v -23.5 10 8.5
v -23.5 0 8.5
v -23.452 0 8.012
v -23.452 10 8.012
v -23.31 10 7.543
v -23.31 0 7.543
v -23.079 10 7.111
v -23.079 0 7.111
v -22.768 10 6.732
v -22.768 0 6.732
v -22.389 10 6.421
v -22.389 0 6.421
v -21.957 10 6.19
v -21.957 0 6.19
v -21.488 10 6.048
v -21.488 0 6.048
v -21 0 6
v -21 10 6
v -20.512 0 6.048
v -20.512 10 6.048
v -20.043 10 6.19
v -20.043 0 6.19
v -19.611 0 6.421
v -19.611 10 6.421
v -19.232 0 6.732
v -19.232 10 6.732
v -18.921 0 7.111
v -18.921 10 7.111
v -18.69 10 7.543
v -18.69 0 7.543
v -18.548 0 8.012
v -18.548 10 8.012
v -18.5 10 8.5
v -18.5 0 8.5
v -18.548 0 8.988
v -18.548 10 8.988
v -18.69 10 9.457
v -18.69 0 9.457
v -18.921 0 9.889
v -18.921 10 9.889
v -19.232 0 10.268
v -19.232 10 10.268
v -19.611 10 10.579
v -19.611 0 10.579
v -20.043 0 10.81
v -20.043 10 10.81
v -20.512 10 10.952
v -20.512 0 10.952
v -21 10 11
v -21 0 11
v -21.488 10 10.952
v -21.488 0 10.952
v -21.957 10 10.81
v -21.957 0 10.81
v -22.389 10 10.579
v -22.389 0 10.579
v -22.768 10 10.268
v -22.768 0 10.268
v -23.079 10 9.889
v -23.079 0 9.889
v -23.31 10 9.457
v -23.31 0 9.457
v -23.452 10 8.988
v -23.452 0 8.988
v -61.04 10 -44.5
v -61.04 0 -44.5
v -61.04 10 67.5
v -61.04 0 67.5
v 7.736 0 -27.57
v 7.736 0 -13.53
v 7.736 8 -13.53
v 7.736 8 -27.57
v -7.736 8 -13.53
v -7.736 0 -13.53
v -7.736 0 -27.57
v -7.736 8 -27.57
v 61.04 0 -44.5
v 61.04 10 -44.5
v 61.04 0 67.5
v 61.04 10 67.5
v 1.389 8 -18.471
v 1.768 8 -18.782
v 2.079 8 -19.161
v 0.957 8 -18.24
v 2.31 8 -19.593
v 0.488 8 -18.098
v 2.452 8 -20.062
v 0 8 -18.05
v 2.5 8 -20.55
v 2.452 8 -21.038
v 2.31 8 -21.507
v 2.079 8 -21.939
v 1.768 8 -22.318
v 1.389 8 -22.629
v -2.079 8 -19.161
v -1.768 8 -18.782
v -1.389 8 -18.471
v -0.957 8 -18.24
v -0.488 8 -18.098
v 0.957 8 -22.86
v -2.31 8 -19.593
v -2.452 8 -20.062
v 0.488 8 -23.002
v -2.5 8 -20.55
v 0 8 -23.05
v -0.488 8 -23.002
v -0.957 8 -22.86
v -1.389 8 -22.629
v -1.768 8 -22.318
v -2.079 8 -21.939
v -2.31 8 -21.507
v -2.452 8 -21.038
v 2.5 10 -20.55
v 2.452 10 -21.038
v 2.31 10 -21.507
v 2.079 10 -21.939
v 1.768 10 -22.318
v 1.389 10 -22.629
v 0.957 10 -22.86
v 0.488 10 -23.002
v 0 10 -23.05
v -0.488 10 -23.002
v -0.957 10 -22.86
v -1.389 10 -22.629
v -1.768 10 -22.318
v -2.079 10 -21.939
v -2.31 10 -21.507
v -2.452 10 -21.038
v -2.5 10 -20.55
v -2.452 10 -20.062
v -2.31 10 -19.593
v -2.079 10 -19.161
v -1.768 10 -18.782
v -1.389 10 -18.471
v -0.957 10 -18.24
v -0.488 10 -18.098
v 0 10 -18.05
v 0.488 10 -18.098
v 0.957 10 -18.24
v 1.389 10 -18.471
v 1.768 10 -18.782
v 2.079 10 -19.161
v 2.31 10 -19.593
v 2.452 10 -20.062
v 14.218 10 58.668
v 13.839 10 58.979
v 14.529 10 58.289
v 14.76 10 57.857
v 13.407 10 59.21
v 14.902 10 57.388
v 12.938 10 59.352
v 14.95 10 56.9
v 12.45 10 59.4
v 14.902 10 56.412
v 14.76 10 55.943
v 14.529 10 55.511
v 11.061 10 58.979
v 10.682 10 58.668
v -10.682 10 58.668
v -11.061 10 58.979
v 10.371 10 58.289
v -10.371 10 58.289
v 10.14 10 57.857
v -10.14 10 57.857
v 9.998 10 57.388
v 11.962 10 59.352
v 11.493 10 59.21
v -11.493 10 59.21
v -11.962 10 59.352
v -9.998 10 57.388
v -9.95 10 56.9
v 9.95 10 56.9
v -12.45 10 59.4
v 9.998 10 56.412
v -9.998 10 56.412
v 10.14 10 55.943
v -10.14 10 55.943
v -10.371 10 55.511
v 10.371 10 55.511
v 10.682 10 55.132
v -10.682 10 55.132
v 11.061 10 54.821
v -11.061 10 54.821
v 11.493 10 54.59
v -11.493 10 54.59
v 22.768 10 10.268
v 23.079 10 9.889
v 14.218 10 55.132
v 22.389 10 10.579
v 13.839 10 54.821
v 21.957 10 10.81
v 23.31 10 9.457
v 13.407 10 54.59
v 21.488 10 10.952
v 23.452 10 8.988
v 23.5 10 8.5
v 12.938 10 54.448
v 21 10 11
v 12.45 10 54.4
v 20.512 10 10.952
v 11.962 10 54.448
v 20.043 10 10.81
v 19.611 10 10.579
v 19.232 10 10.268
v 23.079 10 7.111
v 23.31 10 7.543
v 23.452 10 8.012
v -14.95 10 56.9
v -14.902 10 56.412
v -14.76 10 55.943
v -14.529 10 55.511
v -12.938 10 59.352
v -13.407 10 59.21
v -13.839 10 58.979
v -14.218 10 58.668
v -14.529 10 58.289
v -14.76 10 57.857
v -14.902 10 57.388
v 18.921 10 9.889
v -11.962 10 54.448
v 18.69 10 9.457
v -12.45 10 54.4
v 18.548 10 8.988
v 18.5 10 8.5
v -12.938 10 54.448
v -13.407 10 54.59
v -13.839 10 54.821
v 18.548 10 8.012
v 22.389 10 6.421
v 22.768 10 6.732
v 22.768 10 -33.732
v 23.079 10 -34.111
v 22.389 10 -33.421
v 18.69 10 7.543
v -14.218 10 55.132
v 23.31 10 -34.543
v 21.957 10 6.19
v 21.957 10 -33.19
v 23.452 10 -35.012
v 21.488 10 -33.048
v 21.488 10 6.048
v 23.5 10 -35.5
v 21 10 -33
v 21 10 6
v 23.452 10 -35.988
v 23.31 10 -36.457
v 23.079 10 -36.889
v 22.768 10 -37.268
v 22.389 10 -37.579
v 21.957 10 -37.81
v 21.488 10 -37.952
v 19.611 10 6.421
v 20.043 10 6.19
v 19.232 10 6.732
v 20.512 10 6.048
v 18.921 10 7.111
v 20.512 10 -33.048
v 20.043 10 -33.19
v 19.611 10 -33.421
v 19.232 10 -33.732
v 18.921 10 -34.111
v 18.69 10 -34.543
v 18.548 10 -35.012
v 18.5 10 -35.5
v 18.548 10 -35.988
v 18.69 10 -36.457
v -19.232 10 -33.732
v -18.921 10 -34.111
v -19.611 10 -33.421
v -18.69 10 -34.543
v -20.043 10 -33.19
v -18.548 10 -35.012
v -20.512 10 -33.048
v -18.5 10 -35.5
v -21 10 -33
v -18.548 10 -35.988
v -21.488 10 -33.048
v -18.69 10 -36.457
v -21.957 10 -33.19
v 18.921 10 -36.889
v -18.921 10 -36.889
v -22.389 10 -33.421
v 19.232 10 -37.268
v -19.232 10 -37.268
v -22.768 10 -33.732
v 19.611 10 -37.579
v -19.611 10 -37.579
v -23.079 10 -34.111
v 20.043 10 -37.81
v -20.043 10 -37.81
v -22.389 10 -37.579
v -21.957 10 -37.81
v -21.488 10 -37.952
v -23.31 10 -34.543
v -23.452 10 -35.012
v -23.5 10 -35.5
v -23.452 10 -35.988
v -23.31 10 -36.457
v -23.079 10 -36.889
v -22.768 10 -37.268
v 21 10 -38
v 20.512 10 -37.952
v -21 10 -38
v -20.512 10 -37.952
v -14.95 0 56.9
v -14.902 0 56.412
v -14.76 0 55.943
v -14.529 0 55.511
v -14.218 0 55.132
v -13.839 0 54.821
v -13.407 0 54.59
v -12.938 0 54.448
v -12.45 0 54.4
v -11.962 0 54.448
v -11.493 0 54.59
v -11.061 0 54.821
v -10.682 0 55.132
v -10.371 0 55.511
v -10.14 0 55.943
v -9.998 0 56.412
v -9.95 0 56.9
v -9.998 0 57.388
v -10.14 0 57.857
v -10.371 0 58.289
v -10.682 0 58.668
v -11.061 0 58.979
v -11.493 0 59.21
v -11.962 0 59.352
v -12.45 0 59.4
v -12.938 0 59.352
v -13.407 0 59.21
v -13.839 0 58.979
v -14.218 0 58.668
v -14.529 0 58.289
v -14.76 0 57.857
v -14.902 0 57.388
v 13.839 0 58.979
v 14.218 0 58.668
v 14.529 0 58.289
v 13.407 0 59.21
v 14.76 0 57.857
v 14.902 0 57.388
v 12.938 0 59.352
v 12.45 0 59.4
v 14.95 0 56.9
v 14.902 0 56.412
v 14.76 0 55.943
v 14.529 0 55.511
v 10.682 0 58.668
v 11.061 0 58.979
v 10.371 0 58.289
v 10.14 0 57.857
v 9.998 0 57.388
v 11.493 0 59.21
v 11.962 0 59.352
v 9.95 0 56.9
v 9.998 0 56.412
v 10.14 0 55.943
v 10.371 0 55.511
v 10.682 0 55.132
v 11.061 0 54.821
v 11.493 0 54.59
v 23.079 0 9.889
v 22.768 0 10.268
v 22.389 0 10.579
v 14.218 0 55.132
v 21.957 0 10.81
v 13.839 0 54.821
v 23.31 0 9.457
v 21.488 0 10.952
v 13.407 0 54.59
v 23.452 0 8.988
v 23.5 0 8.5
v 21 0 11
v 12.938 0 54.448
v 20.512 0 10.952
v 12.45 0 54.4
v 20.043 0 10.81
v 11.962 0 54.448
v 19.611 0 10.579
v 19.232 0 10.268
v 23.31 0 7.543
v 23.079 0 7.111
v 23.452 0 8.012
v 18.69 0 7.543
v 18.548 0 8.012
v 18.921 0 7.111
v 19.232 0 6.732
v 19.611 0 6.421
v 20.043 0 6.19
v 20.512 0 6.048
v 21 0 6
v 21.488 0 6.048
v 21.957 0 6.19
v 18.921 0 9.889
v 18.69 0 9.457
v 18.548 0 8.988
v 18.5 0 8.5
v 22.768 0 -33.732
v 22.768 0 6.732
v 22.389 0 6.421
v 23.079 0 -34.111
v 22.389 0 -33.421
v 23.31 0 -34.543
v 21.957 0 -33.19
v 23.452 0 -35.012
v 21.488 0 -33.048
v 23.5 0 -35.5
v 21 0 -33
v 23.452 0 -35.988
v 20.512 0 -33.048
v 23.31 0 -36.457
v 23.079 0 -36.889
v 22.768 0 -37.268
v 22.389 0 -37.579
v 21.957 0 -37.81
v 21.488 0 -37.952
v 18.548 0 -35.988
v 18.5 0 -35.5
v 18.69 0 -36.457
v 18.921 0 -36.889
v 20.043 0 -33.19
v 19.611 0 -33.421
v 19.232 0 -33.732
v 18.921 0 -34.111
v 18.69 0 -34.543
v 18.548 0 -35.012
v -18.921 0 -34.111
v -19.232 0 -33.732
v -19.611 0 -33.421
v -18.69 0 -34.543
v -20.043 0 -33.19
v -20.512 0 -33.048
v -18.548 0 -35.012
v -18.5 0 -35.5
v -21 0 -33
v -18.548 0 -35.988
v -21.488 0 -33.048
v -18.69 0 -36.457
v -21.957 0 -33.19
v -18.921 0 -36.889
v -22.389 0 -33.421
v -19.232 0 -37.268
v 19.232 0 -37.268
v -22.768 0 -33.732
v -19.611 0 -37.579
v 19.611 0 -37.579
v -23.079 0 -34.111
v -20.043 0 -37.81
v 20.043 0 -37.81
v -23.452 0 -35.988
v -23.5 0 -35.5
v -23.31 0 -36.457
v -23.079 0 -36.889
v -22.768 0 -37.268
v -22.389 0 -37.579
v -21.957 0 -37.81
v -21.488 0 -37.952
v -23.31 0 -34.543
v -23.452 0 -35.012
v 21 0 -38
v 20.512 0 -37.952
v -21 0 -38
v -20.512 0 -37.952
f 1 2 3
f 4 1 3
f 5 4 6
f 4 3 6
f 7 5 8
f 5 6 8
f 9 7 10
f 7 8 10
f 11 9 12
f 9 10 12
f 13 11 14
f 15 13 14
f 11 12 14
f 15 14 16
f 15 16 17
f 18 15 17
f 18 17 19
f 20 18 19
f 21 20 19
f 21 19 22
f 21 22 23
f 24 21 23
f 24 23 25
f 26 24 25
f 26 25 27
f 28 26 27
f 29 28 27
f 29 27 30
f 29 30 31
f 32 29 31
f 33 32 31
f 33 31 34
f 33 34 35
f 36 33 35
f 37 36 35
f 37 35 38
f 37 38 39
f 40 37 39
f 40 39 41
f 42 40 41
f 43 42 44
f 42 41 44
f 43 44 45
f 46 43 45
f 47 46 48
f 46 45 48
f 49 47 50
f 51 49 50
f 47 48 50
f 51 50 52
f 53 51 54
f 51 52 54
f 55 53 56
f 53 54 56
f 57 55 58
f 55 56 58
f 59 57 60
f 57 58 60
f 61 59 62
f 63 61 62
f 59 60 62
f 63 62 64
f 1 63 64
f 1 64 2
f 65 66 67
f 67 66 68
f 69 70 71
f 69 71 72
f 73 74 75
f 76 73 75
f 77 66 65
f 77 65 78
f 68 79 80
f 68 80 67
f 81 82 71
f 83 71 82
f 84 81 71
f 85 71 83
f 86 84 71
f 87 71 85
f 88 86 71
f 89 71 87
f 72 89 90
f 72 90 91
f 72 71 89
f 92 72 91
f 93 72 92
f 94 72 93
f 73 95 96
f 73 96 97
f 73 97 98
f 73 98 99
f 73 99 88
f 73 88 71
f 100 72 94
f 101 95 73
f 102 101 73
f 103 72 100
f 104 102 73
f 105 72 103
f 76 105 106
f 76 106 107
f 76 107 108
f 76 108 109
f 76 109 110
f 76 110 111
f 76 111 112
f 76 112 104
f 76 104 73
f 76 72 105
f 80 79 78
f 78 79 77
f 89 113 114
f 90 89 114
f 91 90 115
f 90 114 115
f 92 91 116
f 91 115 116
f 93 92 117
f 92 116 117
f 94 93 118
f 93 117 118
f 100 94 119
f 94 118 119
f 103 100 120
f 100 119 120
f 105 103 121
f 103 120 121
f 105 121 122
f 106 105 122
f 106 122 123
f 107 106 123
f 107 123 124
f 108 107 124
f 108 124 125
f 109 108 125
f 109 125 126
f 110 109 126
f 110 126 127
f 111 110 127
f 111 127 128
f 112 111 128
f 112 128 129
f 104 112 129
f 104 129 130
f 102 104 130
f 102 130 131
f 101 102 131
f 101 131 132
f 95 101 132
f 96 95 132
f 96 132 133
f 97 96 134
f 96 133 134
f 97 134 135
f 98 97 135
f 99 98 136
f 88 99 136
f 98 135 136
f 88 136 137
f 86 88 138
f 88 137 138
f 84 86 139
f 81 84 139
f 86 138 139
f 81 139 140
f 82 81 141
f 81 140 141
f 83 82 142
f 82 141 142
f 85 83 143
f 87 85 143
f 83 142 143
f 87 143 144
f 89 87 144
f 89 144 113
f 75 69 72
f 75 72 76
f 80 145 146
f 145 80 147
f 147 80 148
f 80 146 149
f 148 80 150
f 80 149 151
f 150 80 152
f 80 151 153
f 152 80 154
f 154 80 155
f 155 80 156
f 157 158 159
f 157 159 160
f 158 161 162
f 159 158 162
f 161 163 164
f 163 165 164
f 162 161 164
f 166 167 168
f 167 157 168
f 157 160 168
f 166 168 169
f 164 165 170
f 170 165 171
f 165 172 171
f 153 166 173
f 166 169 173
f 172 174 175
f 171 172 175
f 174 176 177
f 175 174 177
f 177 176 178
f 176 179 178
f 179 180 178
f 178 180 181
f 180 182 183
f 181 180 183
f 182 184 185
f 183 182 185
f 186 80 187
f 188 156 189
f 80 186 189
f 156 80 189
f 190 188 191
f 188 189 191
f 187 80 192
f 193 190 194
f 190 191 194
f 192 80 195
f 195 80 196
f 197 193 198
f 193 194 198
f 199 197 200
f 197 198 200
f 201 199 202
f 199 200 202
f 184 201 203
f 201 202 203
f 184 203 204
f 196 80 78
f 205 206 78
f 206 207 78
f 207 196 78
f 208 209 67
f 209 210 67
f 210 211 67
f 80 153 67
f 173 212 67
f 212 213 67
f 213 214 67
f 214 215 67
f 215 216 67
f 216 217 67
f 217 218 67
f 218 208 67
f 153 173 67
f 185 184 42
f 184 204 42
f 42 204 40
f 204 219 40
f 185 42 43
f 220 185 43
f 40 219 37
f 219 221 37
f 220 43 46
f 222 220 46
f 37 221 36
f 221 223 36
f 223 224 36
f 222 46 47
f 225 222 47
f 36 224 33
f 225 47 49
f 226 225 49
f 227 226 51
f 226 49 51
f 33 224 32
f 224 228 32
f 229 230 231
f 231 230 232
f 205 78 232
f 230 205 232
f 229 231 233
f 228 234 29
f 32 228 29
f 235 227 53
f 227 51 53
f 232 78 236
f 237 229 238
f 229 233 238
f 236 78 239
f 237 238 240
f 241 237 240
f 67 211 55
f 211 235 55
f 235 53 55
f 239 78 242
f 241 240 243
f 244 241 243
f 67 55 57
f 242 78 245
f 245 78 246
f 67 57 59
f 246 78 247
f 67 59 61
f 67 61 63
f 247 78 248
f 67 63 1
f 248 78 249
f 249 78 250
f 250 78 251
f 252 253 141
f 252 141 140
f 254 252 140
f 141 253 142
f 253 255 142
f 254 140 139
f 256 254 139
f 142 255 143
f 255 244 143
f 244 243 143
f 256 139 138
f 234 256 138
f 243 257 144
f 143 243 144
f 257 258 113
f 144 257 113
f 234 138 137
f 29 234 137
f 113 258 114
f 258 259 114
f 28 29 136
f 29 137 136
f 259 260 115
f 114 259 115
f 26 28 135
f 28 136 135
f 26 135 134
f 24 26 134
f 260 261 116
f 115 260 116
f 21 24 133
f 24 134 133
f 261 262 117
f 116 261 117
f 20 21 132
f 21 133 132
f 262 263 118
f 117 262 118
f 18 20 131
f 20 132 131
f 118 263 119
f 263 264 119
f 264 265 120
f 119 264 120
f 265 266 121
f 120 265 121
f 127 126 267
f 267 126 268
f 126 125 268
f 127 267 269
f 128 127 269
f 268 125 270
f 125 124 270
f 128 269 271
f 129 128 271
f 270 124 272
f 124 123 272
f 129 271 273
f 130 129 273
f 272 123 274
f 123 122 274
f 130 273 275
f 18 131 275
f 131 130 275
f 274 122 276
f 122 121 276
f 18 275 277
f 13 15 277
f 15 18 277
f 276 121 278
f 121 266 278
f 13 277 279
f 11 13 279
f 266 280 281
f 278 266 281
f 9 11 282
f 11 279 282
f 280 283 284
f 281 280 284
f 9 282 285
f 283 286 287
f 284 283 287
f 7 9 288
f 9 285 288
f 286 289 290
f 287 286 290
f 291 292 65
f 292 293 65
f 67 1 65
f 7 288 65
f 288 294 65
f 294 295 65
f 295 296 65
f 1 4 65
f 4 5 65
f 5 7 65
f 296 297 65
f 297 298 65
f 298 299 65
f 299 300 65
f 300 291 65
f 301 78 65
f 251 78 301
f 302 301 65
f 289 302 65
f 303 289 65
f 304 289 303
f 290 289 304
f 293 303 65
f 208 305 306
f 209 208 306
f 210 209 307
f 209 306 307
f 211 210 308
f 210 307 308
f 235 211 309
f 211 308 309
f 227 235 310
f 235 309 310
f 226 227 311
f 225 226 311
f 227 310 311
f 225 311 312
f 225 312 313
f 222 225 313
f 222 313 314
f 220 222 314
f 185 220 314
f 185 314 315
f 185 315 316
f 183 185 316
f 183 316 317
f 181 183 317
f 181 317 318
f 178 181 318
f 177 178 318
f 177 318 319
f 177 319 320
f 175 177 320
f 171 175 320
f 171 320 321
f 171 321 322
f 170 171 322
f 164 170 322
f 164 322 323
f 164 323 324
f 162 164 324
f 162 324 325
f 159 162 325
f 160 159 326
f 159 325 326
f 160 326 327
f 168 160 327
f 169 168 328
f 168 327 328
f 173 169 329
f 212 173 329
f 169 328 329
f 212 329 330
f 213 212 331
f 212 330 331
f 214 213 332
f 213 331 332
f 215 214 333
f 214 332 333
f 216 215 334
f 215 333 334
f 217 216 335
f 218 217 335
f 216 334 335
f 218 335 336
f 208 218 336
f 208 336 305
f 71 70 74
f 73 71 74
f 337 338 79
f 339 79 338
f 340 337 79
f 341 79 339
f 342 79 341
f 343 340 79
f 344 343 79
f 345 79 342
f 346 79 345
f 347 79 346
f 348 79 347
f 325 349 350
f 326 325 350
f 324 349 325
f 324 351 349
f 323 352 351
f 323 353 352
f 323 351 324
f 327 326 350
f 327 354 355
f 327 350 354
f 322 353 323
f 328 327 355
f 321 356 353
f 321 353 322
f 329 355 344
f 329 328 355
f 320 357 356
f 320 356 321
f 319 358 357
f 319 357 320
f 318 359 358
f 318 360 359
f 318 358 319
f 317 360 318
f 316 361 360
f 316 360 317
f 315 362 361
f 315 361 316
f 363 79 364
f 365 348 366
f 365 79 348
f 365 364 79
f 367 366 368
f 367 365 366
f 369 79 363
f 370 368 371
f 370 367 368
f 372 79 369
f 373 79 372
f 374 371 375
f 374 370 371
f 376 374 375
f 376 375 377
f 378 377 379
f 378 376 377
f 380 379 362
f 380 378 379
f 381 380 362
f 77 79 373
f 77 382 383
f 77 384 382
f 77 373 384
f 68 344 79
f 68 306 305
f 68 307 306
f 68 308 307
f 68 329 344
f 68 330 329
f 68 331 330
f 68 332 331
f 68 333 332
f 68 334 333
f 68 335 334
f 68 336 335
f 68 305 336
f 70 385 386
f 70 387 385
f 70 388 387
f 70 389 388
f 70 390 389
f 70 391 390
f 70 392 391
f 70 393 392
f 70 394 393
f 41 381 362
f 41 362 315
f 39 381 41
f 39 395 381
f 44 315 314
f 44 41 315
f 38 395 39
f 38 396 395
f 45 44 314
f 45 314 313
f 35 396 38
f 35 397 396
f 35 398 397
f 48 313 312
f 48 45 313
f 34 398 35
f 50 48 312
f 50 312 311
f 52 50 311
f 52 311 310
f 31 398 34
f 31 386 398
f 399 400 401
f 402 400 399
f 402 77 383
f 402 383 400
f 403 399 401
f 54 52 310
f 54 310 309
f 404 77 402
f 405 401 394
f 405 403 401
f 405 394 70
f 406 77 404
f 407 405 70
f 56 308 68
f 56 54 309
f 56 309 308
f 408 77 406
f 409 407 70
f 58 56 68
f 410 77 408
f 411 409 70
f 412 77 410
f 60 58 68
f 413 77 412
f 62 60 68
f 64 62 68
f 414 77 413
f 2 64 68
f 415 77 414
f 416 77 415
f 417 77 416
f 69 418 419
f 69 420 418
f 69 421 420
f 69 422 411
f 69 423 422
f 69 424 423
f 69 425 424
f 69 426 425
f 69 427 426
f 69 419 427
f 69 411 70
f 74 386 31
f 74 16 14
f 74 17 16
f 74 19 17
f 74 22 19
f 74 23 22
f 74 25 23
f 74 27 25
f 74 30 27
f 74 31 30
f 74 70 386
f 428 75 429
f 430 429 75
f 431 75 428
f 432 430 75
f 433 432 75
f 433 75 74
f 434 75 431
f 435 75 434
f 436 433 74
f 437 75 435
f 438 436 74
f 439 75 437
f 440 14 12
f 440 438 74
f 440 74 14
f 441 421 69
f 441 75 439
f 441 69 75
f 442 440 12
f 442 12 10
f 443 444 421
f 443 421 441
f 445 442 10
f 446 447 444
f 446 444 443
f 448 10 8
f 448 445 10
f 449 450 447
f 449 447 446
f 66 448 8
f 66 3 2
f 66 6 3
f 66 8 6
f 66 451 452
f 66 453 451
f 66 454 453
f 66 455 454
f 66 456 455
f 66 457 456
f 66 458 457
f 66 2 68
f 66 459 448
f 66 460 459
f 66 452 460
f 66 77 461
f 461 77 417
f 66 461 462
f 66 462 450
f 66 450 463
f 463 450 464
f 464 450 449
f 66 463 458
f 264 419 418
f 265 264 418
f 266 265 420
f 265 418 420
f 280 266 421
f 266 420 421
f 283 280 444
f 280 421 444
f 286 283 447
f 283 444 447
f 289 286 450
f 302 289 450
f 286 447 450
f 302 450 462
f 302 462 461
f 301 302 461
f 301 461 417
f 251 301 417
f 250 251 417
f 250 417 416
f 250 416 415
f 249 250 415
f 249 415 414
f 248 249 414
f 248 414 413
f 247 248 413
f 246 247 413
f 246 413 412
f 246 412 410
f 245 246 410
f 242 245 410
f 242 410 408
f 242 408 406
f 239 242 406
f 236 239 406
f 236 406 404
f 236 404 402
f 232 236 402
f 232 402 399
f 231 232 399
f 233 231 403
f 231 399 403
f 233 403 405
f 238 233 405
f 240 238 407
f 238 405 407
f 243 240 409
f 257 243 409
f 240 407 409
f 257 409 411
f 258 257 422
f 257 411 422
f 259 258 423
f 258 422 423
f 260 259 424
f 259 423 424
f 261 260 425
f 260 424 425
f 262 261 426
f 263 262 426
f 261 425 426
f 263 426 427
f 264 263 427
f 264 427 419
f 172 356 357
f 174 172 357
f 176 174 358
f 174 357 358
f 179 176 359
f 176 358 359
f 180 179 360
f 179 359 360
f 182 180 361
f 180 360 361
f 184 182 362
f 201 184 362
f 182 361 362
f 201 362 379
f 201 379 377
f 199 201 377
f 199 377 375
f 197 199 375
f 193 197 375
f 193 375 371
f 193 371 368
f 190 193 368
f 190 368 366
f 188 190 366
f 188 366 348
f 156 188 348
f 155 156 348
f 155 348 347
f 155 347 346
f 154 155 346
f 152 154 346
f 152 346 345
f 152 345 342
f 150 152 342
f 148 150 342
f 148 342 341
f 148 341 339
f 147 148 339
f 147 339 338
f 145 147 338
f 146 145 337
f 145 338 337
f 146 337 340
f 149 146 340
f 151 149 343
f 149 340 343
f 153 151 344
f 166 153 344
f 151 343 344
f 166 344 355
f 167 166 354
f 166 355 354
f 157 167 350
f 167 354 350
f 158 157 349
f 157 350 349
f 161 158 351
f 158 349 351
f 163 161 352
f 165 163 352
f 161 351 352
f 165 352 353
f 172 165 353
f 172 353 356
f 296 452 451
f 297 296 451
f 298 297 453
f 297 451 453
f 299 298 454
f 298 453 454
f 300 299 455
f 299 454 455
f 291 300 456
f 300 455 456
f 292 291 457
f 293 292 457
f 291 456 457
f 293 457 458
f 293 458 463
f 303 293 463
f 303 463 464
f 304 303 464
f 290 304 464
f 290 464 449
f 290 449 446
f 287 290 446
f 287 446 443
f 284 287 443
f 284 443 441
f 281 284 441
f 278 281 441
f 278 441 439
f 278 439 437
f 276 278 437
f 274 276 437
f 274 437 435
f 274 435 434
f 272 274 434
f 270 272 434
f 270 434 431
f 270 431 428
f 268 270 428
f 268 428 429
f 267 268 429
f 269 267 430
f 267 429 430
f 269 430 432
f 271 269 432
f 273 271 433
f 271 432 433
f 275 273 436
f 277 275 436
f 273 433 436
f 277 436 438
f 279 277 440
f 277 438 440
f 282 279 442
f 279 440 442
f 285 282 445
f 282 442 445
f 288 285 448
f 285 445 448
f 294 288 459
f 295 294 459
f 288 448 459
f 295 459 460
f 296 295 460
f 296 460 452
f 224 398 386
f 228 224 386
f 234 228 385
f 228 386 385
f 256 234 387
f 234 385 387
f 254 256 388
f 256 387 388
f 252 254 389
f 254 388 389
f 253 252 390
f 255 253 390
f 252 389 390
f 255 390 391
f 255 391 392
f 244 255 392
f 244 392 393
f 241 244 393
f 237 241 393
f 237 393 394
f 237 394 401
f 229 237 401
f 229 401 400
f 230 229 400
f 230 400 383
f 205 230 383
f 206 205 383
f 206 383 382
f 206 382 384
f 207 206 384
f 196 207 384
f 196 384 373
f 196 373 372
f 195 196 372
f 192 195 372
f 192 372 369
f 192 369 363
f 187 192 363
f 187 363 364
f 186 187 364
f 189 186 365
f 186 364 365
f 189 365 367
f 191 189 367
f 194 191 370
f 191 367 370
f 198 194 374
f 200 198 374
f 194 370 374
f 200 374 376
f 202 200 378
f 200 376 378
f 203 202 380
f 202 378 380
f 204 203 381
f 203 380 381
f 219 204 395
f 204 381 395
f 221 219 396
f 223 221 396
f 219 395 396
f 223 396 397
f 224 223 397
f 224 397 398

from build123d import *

# Parameters (mm, degrees)
BOSS_EXTRUDE1_DEPTH = 10
M6_TAPPED_HOLE2_D   = 5
M6_TAPPED_HOLE5_D   = 5
SKETCH14_W          = 15.472798768
SKETCH14_H          = 14.039377176
CUT_EXTRUDE1_DEPTH  = 8
M6_TAPPED_HOLE7_D   = 5


with BuildPart() as part:
    # Sketch2 → Boss-Extrude1 (new body)
    with BuildSketch(Plane(origin=(0, 0, 0), x_dir=(1, 0, 0), z_dir=(0, 1, 0))):
        Polygon((61.04, -67.5), (-61.04, -67.5), (-61.04, 37.5), (-61.04, 44.5), (61.04, 44.5), (61.04, 37.5), align=None)
    extrude(amount=BOSS_EXTRUDE1_DEPTH)

    # M6 Tapped Hole2 (through all)
    with Locations(Plane(origin=(0, 10, 0), x_dir=(1, 0, 0), z_dir=(0, 1, 0))):
        with Locations((-21, -8.5), (21, -8.5), (21, 35.5), (-21, 35.5)):
            Hole(M6_TAPPED_HOLE2_D / 2)

    # M6 Tapped Hole5 (through all)
    with Locations(Plane(origin=(0, 10, 0), x_dir=(1, 0, 0), z_dir=(0, 1, 0))):
        with Locations((-12.45, -56.9), (12.45, -56.9)):
            Hole(M6_TAPPED_HOLE5_D / 2)

    # Sketch14 → Cut-Extrude1 (cut)
    with BuildSketch(Plane(origin=(0, 0, 0), x_dir=(-1, 0, 0), z_dir=(0, -1, 0))):
        with Locations((0, 20.55)):
            Rectangle(SKETCH14_W, SKETCH14_H)
    extrude(amount=-CUT_EXTRUDE1_DEPTH, mode=Mode.SUBTRACT)

    # M6 Tapped Hole7 (through all)
    with Locations(Plane(origin=(0, 0, 0), x_dir=(-1, 0, 0), z_dir=(0, -1, 0))):
        with Locations((0, 20.55)):
            Hole(M6_TAPPED_HOLE7_D / 2)


solid = part.part
